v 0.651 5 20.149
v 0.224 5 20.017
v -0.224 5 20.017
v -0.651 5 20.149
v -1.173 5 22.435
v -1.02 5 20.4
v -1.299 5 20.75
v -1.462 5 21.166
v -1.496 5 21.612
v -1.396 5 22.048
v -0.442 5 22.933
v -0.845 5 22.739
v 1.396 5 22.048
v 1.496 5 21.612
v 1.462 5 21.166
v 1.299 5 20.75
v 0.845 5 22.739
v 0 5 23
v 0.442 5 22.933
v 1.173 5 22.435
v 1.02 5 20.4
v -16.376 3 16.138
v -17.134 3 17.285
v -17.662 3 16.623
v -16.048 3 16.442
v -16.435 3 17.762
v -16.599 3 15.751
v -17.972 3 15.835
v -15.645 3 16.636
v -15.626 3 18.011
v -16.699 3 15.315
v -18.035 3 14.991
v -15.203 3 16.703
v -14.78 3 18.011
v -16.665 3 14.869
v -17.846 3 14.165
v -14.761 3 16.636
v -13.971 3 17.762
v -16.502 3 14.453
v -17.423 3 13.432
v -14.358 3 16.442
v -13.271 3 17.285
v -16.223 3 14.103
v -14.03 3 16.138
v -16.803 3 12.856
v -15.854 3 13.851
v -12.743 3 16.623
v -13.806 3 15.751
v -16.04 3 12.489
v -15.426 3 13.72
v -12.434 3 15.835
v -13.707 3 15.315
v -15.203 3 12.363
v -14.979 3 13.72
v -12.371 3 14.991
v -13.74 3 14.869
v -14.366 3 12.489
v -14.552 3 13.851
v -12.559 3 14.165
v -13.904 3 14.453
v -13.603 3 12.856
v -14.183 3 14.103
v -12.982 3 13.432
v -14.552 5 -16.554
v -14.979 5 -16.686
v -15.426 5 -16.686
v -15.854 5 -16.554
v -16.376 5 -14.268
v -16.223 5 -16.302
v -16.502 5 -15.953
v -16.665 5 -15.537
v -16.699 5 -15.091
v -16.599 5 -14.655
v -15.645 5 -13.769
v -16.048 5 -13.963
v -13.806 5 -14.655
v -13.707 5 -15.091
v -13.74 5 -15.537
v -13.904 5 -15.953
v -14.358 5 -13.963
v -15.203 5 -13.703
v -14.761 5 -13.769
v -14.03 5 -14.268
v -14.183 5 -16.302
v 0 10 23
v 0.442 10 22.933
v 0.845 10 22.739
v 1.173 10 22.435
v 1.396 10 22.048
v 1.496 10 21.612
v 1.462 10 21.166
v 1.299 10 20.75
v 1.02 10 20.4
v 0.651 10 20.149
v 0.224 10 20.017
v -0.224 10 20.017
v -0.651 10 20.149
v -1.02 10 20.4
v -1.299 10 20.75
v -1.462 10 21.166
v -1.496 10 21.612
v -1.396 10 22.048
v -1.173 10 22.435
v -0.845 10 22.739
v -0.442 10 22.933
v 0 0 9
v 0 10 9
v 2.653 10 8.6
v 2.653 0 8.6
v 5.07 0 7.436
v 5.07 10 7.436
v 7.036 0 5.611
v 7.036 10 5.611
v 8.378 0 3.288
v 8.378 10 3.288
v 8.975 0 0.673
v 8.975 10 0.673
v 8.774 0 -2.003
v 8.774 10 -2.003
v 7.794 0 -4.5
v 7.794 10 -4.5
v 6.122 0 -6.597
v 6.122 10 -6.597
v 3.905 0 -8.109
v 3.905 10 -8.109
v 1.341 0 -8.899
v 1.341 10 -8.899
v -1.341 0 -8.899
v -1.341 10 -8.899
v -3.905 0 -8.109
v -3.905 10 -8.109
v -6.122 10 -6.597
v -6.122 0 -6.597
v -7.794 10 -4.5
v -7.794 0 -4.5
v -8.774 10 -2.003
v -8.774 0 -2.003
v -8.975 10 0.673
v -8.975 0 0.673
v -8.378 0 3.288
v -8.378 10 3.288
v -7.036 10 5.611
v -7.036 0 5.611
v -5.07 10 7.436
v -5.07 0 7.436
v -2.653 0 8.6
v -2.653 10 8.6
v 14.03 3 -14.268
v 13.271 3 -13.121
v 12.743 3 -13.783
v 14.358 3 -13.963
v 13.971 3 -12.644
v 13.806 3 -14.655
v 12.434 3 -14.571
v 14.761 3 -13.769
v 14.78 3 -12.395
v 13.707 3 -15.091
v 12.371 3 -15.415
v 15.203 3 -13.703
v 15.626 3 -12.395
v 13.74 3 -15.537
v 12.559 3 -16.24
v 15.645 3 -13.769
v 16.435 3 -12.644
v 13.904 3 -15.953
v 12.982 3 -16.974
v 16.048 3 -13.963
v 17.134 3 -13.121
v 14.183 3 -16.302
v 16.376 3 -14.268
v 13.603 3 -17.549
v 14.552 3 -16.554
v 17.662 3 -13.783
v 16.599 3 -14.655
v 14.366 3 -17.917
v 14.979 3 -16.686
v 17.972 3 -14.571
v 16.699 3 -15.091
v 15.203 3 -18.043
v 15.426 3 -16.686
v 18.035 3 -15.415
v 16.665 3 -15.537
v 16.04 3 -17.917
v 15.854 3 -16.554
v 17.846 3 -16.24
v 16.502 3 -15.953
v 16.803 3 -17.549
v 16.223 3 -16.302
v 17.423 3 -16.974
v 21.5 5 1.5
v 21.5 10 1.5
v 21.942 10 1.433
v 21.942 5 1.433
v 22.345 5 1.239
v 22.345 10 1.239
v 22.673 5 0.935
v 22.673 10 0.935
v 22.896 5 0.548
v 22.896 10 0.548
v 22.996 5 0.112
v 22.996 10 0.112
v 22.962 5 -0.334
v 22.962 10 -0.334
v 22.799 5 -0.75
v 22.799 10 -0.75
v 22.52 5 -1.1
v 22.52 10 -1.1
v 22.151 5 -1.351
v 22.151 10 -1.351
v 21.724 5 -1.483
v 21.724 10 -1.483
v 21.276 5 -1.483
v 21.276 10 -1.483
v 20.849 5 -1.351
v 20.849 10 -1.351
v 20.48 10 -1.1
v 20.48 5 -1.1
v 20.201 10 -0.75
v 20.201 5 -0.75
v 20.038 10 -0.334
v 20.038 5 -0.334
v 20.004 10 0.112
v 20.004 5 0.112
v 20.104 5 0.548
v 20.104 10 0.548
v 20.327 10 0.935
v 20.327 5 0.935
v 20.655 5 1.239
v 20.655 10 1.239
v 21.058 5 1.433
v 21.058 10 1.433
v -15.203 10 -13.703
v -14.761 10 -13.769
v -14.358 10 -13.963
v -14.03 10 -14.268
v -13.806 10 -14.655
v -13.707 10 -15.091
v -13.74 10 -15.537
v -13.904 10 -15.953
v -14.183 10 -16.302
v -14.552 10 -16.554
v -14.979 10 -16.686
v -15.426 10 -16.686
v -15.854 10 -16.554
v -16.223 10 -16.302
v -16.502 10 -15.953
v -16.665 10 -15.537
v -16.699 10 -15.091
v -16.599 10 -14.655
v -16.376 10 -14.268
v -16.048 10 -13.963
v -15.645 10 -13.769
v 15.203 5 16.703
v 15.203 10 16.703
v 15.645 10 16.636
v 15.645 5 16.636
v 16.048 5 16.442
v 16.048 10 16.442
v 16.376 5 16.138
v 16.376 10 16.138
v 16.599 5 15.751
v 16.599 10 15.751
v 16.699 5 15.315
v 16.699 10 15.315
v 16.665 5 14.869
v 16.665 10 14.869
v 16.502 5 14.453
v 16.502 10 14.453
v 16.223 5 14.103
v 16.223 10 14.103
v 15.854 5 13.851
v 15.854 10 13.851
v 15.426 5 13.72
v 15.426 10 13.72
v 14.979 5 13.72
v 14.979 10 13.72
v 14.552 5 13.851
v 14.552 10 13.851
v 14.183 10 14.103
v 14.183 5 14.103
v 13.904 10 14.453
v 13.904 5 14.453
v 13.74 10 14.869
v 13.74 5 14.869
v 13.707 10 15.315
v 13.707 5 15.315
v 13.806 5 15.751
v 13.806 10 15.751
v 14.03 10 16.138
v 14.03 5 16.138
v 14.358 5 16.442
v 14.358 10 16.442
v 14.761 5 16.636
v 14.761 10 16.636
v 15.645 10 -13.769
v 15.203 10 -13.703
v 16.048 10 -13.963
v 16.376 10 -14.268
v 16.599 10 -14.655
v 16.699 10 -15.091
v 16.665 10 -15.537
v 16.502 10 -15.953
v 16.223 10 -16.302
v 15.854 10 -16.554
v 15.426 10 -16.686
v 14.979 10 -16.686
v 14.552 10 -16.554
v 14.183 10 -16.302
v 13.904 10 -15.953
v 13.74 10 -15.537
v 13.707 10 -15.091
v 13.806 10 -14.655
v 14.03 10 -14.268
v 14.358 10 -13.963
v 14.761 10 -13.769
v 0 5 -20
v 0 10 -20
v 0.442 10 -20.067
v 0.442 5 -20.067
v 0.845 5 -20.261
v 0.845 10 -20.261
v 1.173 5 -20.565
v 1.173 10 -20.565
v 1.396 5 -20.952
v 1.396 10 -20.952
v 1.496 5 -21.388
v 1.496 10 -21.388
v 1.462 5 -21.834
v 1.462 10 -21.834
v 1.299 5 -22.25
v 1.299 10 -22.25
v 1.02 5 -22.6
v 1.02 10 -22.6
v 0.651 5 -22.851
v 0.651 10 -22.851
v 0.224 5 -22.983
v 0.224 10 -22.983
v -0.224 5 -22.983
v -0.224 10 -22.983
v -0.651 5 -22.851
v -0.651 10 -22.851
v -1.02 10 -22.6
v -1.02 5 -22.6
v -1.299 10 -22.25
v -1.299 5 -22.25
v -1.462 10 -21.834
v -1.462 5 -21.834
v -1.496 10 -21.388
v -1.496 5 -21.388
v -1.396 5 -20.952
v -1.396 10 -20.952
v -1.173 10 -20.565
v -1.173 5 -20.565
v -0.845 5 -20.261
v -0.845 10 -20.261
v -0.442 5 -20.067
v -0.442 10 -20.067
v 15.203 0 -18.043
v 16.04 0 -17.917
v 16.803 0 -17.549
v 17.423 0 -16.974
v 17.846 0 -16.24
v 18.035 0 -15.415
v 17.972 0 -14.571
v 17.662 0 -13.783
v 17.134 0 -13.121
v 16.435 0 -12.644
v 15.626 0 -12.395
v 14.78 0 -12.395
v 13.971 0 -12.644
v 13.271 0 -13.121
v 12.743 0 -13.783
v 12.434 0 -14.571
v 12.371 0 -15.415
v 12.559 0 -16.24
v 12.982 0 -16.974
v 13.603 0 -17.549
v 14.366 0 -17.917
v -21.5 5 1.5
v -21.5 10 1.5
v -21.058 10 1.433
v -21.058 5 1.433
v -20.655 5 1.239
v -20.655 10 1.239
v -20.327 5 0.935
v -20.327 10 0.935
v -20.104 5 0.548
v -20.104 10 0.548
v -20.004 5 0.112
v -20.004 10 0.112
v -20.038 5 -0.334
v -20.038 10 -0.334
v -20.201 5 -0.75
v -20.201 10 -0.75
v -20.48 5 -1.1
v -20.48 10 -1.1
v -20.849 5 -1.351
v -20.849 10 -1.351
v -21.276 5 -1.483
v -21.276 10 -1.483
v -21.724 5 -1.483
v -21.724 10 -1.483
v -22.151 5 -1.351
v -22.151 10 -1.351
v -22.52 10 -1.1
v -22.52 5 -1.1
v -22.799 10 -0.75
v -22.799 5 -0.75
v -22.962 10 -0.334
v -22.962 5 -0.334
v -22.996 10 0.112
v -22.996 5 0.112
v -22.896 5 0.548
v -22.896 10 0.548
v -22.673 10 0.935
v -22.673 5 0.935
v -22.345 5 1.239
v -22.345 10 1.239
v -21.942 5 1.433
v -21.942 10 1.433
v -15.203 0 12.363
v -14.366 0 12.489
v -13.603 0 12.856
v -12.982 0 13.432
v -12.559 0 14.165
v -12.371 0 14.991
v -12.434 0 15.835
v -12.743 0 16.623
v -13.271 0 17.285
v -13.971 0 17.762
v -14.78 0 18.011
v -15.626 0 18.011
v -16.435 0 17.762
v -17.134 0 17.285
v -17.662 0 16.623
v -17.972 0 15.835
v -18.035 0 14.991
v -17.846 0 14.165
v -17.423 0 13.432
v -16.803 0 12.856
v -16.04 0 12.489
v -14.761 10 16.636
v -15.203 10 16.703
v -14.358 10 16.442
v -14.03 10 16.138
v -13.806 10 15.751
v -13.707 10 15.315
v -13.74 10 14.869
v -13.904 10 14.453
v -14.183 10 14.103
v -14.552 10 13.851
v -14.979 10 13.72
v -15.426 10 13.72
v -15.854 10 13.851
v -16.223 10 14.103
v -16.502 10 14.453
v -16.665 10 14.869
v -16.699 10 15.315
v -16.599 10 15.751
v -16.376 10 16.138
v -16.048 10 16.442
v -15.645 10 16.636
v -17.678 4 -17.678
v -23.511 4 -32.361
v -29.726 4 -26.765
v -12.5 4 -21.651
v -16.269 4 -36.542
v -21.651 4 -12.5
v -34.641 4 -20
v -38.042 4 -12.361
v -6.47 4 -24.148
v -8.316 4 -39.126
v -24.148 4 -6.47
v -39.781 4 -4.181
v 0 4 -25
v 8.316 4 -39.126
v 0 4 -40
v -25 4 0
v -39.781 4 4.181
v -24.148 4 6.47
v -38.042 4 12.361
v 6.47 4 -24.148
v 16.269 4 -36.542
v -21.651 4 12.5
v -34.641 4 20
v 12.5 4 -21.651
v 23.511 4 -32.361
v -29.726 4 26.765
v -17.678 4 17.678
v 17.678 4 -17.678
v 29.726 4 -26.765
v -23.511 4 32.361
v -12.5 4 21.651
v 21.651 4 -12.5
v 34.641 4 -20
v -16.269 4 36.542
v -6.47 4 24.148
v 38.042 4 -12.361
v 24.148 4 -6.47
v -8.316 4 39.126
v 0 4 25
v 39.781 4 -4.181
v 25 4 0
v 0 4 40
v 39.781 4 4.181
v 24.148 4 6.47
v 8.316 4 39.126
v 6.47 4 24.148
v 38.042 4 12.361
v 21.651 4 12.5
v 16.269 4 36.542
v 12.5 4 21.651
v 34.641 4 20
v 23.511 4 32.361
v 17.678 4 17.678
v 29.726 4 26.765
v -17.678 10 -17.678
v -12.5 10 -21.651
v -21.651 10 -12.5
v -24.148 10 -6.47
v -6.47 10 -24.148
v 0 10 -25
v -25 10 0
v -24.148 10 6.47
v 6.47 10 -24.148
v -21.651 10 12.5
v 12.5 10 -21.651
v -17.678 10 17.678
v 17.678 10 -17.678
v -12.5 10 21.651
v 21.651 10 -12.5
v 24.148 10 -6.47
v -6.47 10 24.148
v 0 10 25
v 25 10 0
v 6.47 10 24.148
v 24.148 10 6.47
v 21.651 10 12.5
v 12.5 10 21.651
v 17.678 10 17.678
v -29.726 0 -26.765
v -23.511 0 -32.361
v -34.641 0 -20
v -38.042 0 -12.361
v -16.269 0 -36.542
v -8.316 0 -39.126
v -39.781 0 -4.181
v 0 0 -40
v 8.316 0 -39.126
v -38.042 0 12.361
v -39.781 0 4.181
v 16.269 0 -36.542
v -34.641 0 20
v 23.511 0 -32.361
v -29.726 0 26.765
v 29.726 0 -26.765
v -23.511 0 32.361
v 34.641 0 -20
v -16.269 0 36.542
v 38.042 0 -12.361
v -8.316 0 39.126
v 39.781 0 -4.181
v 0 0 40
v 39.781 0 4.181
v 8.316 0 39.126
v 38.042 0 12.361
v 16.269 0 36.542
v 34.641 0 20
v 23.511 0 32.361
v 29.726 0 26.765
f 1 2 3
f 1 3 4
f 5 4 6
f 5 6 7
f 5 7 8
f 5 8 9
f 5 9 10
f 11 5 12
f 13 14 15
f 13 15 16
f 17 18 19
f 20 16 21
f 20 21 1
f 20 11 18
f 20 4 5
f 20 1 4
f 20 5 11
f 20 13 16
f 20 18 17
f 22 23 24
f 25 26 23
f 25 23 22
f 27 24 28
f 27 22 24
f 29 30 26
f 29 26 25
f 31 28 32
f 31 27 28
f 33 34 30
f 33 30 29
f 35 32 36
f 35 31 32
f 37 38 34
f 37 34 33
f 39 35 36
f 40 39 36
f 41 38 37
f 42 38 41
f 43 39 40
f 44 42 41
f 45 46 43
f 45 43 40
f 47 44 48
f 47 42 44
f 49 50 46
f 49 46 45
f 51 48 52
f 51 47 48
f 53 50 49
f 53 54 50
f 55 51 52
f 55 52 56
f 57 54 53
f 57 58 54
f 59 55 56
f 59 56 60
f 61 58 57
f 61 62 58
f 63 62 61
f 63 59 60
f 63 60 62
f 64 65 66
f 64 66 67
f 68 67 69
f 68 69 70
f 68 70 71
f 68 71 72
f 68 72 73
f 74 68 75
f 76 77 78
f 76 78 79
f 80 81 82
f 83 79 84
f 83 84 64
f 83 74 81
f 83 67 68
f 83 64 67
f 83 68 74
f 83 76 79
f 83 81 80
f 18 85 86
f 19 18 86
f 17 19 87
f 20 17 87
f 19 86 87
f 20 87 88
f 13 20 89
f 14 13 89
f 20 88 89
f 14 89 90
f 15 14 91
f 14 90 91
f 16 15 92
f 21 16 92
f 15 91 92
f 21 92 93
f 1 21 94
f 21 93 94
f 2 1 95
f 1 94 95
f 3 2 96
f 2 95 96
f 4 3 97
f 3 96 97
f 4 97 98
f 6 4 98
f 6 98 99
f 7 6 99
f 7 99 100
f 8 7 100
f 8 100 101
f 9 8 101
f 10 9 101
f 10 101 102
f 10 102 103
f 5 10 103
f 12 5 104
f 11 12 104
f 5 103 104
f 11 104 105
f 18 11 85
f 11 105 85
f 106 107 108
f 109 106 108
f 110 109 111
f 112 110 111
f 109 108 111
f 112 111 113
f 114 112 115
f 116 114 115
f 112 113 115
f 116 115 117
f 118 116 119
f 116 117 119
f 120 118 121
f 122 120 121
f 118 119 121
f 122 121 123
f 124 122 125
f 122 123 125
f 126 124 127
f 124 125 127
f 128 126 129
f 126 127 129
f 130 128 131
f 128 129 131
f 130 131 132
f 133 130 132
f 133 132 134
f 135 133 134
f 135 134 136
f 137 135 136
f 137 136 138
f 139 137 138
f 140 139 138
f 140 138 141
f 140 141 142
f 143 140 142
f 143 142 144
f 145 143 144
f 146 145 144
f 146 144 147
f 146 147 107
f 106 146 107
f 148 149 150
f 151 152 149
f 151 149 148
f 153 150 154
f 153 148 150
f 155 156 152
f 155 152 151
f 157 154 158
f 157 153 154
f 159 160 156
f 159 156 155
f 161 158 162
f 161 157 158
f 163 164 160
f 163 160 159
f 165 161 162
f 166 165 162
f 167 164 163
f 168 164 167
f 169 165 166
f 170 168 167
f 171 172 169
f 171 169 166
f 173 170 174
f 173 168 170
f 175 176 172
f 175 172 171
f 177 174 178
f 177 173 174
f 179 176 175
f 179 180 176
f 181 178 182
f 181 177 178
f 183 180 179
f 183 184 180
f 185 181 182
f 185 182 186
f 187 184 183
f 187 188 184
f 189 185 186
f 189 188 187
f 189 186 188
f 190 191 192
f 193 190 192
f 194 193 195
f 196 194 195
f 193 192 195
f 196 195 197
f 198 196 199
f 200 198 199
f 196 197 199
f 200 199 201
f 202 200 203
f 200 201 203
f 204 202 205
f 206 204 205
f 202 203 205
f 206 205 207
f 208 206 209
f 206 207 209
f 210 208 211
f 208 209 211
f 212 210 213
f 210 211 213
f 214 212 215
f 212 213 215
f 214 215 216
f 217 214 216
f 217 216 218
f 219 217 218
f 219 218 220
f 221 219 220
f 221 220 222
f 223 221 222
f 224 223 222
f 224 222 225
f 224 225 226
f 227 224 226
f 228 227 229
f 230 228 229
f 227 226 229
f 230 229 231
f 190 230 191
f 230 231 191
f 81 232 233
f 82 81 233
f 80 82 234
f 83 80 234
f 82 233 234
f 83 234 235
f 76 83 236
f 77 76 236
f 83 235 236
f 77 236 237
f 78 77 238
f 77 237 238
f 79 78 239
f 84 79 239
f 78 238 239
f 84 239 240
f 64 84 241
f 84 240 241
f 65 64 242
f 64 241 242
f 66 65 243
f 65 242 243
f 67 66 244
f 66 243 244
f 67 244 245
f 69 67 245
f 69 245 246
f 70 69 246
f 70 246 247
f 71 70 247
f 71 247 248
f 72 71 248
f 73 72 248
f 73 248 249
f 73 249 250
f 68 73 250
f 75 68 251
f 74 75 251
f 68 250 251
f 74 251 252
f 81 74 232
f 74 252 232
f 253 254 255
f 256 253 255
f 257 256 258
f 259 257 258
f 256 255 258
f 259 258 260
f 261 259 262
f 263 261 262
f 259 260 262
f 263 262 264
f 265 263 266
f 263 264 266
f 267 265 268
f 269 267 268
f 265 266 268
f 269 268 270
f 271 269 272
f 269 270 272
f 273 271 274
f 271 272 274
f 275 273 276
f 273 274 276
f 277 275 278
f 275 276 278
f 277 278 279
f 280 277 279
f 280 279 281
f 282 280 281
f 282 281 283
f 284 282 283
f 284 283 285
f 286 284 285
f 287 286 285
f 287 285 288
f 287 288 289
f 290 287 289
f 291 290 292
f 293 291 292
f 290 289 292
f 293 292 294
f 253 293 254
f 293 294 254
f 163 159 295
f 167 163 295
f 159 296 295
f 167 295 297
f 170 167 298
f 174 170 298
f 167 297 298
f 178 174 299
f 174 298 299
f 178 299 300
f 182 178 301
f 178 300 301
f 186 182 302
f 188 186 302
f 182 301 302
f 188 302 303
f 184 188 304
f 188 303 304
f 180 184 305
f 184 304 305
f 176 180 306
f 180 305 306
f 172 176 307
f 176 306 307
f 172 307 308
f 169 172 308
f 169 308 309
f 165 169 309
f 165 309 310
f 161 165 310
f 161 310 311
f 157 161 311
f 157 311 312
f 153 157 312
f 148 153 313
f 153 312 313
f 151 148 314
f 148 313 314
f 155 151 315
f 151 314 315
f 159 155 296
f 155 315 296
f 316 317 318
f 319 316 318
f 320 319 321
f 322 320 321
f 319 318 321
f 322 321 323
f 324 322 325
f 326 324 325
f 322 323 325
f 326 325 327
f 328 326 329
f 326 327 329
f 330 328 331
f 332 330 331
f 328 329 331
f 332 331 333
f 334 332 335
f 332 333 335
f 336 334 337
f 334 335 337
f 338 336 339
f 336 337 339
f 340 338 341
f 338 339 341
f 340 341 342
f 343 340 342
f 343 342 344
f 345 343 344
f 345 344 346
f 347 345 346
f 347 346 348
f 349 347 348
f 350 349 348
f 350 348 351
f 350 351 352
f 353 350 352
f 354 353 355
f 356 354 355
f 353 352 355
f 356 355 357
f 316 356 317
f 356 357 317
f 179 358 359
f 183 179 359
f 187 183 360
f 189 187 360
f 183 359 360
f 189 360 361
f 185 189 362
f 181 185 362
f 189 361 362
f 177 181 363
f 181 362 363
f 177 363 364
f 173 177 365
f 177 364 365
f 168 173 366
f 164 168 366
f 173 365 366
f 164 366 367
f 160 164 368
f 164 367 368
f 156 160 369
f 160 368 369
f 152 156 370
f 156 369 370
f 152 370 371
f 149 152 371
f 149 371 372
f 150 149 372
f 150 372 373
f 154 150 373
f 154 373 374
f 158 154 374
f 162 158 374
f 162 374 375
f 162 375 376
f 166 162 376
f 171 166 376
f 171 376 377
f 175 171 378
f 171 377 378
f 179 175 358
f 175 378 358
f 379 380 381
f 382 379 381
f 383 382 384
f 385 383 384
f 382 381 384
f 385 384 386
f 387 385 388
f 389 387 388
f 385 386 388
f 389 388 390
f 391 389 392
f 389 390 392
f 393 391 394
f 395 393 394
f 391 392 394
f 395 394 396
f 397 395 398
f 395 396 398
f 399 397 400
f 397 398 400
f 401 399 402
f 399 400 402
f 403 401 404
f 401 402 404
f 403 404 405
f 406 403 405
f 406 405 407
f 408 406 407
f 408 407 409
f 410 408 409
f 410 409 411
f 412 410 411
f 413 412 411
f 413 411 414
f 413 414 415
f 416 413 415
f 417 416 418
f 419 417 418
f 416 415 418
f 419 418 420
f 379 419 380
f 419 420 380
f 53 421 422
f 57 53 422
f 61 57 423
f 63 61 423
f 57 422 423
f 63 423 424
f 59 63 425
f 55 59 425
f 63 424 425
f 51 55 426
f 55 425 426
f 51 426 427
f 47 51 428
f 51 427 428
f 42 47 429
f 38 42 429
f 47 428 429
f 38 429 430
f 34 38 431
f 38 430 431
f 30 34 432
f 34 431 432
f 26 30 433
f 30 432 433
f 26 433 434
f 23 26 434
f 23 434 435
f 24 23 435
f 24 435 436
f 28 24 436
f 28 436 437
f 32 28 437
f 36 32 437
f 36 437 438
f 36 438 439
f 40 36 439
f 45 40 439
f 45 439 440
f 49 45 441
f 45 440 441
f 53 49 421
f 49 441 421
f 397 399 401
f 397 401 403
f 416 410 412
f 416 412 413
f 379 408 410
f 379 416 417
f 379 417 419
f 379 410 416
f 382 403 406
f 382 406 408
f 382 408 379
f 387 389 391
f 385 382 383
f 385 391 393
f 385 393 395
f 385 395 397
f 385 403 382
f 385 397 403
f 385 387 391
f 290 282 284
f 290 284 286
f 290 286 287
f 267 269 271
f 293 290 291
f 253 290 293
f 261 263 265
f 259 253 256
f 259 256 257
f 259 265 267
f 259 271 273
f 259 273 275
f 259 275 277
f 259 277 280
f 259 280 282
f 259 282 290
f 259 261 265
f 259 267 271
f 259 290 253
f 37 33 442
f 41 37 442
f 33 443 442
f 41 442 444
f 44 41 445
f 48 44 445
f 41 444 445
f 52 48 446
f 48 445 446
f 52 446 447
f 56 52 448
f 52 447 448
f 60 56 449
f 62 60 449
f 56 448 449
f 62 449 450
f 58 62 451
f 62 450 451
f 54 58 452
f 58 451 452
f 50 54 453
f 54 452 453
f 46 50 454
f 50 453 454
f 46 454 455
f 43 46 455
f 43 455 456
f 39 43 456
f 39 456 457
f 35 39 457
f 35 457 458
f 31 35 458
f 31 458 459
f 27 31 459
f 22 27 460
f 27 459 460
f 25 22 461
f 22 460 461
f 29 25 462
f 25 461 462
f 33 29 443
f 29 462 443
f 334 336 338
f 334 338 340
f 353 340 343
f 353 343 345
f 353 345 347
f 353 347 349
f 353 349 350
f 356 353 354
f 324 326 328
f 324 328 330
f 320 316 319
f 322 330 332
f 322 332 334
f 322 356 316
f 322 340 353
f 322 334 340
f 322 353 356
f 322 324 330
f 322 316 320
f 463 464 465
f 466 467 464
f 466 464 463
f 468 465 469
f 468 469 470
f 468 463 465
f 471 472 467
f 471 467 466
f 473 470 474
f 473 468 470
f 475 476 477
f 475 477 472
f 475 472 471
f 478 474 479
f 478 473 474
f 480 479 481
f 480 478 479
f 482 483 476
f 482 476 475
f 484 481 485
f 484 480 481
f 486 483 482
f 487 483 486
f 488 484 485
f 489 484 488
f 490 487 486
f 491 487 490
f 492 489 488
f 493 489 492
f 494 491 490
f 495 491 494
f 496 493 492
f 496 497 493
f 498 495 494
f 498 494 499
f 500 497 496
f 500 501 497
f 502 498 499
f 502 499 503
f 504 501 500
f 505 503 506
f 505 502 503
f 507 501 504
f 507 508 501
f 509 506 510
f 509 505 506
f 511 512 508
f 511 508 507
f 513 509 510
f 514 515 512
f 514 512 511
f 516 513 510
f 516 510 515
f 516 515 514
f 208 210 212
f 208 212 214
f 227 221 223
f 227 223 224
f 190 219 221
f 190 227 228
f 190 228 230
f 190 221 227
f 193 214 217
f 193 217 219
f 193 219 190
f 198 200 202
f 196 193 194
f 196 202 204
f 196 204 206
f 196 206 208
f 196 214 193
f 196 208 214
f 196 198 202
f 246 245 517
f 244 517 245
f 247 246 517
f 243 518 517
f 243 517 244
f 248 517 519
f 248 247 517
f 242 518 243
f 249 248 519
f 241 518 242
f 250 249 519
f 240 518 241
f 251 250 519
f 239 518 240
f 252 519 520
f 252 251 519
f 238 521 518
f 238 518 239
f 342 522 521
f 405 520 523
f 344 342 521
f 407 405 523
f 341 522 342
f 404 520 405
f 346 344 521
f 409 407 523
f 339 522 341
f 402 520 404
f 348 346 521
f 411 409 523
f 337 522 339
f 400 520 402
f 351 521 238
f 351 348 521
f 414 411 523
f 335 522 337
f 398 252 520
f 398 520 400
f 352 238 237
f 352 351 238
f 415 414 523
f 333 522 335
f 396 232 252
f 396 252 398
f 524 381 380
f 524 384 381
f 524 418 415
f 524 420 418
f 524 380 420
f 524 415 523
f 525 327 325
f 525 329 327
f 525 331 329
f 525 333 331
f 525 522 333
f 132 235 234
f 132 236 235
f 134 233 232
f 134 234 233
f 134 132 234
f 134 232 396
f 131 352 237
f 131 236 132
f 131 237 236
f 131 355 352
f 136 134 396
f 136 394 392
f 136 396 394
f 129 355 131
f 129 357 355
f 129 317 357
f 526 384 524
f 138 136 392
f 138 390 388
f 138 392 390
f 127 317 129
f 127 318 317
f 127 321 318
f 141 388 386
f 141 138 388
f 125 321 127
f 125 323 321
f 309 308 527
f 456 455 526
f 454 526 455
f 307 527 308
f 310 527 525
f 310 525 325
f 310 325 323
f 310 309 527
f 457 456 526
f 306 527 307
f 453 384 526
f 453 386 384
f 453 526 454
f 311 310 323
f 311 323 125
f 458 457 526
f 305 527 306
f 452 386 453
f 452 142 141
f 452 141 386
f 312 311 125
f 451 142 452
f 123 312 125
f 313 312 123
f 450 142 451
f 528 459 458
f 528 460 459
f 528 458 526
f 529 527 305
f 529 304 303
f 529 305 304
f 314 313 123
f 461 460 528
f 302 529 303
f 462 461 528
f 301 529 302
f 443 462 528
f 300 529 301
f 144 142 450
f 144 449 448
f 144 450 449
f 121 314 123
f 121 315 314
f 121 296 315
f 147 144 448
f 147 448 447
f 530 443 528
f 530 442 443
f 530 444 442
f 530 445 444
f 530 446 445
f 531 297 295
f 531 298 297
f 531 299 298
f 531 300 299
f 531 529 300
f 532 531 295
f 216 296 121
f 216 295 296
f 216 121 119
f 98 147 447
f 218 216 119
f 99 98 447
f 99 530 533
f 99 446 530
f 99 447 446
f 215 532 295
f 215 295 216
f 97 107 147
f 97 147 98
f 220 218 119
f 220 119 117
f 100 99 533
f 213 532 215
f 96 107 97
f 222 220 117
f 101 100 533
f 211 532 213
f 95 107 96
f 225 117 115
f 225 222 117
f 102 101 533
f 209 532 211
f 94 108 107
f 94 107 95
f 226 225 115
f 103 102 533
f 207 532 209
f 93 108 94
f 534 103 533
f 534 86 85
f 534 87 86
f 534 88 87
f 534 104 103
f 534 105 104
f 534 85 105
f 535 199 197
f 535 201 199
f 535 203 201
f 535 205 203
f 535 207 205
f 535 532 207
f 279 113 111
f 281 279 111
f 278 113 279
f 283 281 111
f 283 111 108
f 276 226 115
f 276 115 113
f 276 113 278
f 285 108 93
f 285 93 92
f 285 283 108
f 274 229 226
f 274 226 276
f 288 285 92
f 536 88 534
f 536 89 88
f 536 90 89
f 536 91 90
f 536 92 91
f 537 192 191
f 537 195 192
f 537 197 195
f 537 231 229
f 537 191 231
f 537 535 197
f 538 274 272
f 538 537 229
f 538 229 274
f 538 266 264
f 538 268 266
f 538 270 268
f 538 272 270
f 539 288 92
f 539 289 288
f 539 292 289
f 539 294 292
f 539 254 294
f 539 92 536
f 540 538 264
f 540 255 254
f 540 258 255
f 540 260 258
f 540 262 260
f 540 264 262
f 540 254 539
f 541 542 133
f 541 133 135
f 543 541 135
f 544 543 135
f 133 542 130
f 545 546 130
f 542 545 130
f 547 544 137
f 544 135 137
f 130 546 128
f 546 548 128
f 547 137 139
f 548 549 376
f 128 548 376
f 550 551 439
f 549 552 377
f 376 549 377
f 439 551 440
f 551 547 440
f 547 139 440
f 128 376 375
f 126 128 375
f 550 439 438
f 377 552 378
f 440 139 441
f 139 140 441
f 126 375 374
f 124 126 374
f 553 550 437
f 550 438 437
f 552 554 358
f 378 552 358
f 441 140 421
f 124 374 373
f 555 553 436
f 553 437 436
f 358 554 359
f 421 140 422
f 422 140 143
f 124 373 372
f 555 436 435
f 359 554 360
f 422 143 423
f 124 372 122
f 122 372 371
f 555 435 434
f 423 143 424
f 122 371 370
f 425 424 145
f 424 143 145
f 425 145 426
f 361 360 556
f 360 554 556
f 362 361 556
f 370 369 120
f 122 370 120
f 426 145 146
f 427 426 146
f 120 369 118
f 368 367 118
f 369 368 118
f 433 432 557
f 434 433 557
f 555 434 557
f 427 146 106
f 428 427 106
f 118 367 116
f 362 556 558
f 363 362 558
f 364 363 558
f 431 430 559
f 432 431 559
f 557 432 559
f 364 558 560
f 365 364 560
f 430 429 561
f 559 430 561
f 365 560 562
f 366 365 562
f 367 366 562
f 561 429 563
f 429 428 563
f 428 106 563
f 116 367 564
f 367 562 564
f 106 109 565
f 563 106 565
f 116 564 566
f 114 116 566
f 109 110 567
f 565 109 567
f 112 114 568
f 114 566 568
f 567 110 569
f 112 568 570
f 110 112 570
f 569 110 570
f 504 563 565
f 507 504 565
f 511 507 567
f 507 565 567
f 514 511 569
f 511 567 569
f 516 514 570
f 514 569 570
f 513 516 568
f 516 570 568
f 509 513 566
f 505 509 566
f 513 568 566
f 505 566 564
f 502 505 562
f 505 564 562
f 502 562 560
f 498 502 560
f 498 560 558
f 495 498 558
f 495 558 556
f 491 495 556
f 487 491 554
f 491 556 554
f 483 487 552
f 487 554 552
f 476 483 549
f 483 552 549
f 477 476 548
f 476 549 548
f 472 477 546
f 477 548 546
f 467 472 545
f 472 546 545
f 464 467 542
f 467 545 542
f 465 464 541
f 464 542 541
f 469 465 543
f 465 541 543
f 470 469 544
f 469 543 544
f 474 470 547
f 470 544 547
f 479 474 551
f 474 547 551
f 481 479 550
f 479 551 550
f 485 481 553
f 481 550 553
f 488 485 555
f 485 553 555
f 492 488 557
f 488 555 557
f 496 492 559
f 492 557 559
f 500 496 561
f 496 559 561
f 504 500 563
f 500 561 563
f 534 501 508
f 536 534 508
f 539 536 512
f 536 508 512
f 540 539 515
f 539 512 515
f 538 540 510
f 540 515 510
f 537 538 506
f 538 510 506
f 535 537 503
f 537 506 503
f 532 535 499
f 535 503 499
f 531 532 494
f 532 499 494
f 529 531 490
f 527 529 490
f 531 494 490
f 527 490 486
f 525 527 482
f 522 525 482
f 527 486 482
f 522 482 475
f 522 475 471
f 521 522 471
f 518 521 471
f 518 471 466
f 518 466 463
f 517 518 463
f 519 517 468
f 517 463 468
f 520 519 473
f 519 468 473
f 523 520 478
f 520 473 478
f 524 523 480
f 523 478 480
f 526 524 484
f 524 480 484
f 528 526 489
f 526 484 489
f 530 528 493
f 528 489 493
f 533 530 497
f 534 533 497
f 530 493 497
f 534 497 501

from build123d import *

# Parameters (mm, degrees)
SKETCH1_R           = 40
BOSS_EXTRUDE1_DEPTH = 4
SKETCH2_R           = 25
BOSS_EXTRUDE2_DEPTH = 6
SKETCH3_R           = 1.5
CUT_EXTRUDE1_DEPTH  = 5
SKETCH4_R           = 9
CUT_EXTRUDE2_DEPTH  = 58.445626465
SKETCH5_R           = 1.5
CUT_EXTRUDE3_DEPTH  = 57.789083458
SKETCH6_R           = 2.84
CUT_EXTRUDE4_DEPTH  = 3


with BuildPart() as part:
    # Sketch1 → Boss-Extrude1 (new body)
    with BuildSketch(Plane(origin=(0, 0, 0), x_dir=(1, 0, 0), z_dir=(0, 1, 0))):
        with Locations(Location((0, 0, 0), (0, 0, 270))):
            Circle(SKETCH1_R)
    extrude(amount=BOSS_EXTRUDE1_DEPTH)

    # Sketch2 → Boss-Extrude2 (add)
    with BuildSketch(Plane(origin=(0, 4, 0), x_dir=(1, 0, 0), z_dir=(0, 1, 0))):
        with Locations(Location((0, 0, 0), (0, 0, 270))):
            Circle(SKETCH2_R)
    extrude(amount=BOSS_EXTRUDE2_DEPTH)

    # Sketch3 → Cut-Extrude1 (cut)
    with BuildSketch(Plane(origin=(0, 10, 0), x_dir=(1, 0, 0), z_dir=(0, 1, 0))):
        with Locations(Location((0, -21.5, 0), (0, 0, 270))):
            Circle(SKETCH3_R)
        with Locations(Location((-15.202795796, -15.202795796, 0), (0, 0, 270))):
            Circle(SKETCH3_R)
        with Locations(Location((-21.5, 0, 0), (0, 0, 270))):
            Circle(SKETCH3_R)
        with Locations(Location((-15.202795796, 15.202795796, 0), (0, 0, 270))):
            Circle(SKETCH3_R)
        with Locations(Location((0, 21.5, 0), (0, 0, 270))):
            Circle(SKETCH3_R)
        with Locations(Location((15.202795796, 15.202795796, 0), (0, 0, 270))):
            Circle(SKETCH3_R)
        with Locations(Location((21.5, 0, 0), (0, 0, 270))):
            Circle(SKETCH3_R)
        with Locations(Location((15.202795796, -15.202795796, 0), (0, 0, 270))):
            Circle(SKETCH3_R)
    extrude(amount=-CUT_EXTRUDE1_DEPTH, mode=Mode.SUBTRACT)

    # Sketch4 → Cut-Extrude2 (cut, through all)
    with BuildSketch(Plane(origin=(0, 10, 0), x_dir=(1, 0, 0), z_dir=(0, 1, 0))):
        with Locations(Location((0, 0, 0), (0, 0, 270))):
            Circle(SKETCH4_R)
    extrude(amount=-CUT_EXTRUDE2_DEPTH, mode=Mode.SUBTRACT)

    # Sketch5 → Cut-Extrude3 (cut, through all)
    with BuildSketch(Plane(origin=(0, 5, 0), x_dir=(1, 0, 0), z_dir=(0, 1, 0))):
        with Locations(Location((15.202795796, 15.202795796, 0), (0, 0, 270))):
            Circle(SKETCH5_R)
        with Locations(Location((-15.202795796, -15.202795796, 0), (0, 0, 270))):
            Circle(SKETCH5_R)
    extrude(amount=-CUT_EXTRUDE3_DEPTH, mode=Mode.SUBTRACT)

    # Sketch6 → Cut-Extrude4 (cut)
    with BuildSketch(Plane.XZ):
        with Locations(Location((-15.202795796, 15.202795796, 0), (0, 0, 270))):
            Circle(SKETCH6_R)
        with Locations(Location((15.202795796, -15.202795796, 0), (0, 0, 270))):
            Circle(SKETCH6_R)
    extrude(amount=-CUT_EXTRUDE4_DEPTH, mode=Mode.SUBTRACT)


solid = part.part
